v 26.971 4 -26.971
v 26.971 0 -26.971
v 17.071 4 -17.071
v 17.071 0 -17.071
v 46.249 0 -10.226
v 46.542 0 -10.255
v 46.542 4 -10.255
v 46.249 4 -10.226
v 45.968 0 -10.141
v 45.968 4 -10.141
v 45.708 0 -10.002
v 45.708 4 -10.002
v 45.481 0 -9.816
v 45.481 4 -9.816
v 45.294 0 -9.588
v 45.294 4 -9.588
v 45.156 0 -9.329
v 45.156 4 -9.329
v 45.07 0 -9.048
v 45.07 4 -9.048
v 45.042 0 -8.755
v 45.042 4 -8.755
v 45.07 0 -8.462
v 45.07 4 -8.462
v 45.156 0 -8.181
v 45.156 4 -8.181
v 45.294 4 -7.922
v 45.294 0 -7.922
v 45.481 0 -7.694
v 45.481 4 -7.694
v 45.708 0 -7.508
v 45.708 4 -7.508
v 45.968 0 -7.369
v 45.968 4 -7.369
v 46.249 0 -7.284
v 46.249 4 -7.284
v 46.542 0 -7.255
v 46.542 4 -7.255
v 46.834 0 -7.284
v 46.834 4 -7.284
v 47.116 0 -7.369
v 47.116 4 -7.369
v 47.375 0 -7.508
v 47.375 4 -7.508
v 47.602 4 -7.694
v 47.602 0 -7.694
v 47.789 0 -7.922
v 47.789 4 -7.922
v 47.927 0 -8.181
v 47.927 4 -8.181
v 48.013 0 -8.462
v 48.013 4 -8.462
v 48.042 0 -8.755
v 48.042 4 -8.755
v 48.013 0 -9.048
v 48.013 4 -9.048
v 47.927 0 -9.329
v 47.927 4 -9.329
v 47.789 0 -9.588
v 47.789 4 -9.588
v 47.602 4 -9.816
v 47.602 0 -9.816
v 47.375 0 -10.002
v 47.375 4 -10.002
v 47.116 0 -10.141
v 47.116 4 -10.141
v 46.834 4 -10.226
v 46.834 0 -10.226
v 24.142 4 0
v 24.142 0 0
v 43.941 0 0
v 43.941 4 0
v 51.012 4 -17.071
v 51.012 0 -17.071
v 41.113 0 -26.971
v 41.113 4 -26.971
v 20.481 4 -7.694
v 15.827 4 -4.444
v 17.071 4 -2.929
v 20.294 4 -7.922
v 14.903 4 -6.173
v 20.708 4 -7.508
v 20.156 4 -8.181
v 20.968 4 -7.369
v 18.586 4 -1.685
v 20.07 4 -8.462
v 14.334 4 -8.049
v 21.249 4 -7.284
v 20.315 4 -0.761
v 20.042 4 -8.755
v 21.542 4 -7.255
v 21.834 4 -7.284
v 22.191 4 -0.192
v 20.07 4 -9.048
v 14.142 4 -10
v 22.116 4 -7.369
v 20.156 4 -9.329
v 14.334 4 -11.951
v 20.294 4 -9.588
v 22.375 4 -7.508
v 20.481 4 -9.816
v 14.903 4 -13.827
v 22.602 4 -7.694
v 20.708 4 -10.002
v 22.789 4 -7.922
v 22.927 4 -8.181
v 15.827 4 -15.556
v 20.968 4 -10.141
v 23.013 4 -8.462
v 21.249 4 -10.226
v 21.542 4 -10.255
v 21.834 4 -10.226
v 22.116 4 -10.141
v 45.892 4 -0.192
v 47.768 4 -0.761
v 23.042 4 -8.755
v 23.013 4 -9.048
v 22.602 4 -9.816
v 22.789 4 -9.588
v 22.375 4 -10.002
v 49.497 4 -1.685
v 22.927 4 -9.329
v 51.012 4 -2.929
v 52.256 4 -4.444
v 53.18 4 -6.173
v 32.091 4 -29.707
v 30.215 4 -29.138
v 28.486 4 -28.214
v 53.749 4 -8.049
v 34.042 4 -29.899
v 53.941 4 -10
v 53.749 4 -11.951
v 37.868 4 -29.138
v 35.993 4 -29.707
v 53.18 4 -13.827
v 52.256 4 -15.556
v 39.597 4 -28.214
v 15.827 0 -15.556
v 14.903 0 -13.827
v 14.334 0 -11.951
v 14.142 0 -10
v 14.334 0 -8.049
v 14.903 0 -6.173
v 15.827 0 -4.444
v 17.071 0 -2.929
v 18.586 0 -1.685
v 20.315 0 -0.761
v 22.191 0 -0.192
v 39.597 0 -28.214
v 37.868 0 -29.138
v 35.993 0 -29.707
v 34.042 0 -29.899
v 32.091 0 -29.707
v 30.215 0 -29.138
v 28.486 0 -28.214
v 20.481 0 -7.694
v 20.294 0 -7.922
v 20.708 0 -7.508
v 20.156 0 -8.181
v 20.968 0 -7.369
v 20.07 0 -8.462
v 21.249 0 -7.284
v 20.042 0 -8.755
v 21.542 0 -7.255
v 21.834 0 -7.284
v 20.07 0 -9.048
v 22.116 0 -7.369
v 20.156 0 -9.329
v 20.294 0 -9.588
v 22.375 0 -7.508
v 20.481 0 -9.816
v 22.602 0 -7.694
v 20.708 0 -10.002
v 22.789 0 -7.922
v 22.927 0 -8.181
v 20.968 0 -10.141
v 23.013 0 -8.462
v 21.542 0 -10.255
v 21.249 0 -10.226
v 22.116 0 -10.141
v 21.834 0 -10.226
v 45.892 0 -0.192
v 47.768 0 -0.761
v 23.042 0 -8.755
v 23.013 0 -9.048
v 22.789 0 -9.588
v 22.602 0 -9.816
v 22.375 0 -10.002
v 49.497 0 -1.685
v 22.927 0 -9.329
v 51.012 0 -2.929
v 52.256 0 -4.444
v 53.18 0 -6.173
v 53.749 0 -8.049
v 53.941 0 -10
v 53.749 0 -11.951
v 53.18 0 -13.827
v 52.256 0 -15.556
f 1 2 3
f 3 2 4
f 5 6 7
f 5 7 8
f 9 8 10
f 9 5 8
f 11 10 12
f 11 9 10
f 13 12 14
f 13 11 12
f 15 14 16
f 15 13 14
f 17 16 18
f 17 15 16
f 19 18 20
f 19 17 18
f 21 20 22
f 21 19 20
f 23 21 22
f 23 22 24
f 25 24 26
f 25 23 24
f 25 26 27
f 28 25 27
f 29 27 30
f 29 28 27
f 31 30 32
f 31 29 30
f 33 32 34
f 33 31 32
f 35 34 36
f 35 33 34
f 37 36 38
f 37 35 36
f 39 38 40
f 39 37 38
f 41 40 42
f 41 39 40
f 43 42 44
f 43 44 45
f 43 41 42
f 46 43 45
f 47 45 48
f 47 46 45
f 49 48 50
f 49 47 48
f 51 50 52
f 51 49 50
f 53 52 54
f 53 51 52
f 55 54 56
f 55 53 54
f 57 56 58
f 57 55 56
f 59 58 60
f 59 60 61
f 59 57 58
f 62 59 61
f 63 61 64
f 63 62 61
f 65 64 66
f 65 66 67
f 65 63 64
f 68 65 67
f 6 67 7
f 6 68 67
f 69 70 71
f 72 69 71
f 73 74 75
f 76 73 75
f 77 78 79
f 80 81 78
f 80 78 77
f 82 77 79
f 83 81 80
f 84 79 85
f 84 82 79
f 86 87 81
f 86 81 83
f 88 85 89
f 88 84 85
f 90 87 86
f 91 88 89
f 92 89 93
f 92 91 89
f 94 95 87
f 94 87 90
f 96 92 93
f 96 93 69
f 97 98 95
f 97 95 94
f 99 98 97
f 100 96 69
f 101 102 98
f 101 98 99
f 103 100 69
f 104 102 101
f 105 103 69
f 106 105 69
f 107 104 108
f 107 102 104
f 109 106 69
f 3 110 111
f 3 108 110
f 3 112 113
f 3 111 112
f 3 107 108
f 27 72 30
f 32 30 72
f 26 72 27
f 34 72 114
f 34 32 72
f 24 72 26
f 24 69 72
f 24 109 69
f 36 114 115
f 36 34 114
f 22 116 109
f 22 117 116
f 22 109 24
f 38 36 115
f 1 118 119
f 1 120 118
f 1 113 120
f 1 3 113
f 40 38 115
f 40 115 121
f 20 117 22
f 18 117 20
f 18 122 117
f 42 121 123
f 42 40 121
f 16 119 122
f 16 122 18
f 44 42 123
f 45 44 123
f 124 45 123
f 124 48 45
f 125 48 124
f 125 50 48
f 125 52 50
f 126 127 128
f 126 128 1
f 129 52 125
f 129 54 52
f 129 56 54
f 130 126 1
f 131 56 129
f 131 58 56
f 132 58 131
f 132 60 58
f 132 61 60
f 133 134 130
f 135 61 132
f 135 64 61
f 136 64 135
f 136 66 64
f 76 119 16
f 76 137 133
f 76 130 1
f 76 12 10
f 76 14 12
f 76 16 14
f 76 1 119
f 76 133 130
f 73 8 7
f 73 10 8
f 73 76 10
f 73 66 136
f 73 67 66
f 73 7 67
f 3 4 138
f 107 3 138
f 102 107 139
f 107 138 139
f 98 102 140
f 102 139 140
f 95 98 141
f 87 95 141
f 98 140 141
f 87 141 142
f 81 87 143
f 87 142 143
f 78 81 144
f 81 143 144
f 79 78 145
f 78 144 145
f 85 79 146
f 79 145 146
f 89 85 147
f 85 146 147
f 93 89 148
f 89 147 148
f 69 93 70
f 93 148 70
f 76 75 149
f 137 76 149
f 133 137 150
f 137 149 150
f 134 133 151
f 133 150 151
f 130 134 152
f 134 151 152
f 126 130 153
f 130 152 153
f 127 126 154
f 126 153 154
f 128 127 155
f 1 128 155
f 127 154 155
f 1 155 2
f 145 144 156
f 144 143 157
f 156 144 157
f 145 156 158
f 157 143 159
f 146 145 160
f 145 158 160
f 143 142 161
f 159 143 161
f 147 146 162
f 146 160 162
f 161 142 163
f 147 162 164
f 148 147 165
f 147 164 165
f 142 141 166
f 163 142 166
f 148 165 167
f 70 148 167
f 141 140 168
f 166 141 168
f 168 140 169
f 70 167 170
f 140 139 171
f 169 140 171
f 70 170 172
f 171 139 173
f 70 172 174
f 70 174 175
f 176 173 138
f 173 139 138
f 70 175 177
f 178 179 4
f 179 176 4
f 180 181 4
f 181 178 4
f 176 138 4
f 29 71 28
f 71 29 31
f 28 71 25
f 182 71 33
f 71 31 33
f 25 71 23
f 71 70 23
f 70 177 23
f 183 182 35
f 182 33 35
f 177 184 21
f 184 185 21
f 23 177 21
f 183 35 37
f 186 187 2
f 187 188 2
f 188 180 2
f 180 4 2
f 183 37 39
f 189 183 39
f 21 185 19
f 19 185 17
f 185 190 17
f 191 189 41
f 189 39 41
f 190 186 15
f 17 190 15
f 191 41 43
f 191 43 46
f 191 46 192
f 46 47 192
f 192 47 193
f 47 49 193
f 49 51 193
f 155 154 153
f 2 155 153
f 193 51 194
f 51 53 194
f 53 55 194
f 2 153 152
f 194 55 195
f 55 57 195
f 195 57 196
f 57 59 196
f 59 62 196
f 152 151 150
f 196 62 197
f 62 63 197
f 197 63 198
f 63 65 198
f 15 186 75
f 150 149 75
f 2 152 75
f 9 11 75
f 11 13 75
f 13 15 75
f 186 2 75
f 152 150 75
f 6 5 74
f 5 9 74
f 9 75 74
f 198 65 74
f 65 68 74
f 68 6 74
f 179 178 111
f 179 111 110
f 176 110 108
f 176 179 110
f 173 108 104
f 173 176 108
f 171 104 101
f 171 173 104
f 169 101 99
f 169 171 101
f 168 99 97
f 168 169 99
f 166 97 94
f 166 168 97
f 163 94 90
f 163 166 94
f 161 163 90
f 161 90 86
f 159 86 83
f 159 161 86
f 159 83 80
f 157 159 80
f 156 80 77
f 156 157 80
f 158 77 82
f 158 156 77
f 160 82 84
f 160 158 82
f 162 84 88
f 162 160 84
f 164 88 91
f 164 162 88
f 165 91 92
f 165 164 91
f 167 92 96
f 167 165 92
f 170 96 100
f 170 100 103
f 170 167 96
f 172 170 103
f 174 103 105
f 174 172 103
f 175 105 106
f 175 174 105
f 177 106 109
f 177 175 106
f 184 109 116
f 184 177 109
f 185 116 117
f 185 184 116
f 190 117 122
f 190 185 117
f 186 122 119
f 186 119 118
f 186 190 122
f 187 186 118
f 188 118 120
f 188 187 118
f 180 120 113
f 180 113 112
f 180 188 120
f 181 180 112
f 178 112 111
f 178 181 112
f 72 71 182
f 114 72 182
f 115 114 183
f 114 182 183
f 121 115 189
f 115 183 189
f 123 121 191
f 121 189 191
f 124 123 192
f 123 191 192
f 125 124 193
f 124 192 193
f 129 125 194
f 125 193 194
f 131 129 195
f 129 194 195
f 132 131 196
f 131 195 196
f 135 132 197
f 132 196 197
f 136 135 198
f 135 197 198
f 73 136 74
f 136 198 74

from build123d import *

# Parameters (mm, degrees)
AUFSATZ_LINEAR_AUSTRAGEN1_DEPTH = 4
SKIZZE4_R                       = 1.5
SCHNITT_LINEAR_AUSTRAGEN4_DEPTH = 4


with BuildPart() as part:
    # Skizze2 → Aufsatz-Linear austragen1 (new body)
    with BuildSketch(Plane(origin=(0, 0, 0), x_dir=(1, 0, 0), z_dir=(0, 1, 0))):
        with BuildLine():
            Line((26.970562748, 26.970562748), (17.071067812, 17.071067812))
            ThreePointArc((17.071067812, 17.071067812), (14.903340299, 6.173165676), (24.142135624, 0))
            Line((24.142135624, 0), (43.941125497, 0))
            ThreePointArc((43.941125497, 0), (53.179920822, 6.173165676), (51.012193309, 17.071067812))
            Line((51.012193309, 17.071067812), (41.112698372, 26.970562748))
            ThreePointArc((41.112698372, 26.970562748), (34.04163056, 29.899494937), (26.970562748, 26.970562748))
        make_face()
    extrude(amount=AUFSATZ_LINEAR_AUSTRAGEN1_DEPTH)

    # Skizze4 → Schnitt-Linear austragen4 (cut)
    with BuildSketch(Plane(origin=(0, 0, 0), x_dir=(1, 0, 0), z_dir=(0, 1, 0))):
        with Locations(Location((21.54163056, 8.754981608, 0), (0, 0, 90))):
            Circle(SKIZZE4_R)
        with Locations(Location((46.54163056, 8.754981608, 0), (0, 0, 90))):
            Circle(SKIZZE4_R)
    extrude(amount=SCHNITT_LINEAR_AUSTRAGEN4_DEPTH, mode=Mode.SUBTRACT)


solid = part.part
